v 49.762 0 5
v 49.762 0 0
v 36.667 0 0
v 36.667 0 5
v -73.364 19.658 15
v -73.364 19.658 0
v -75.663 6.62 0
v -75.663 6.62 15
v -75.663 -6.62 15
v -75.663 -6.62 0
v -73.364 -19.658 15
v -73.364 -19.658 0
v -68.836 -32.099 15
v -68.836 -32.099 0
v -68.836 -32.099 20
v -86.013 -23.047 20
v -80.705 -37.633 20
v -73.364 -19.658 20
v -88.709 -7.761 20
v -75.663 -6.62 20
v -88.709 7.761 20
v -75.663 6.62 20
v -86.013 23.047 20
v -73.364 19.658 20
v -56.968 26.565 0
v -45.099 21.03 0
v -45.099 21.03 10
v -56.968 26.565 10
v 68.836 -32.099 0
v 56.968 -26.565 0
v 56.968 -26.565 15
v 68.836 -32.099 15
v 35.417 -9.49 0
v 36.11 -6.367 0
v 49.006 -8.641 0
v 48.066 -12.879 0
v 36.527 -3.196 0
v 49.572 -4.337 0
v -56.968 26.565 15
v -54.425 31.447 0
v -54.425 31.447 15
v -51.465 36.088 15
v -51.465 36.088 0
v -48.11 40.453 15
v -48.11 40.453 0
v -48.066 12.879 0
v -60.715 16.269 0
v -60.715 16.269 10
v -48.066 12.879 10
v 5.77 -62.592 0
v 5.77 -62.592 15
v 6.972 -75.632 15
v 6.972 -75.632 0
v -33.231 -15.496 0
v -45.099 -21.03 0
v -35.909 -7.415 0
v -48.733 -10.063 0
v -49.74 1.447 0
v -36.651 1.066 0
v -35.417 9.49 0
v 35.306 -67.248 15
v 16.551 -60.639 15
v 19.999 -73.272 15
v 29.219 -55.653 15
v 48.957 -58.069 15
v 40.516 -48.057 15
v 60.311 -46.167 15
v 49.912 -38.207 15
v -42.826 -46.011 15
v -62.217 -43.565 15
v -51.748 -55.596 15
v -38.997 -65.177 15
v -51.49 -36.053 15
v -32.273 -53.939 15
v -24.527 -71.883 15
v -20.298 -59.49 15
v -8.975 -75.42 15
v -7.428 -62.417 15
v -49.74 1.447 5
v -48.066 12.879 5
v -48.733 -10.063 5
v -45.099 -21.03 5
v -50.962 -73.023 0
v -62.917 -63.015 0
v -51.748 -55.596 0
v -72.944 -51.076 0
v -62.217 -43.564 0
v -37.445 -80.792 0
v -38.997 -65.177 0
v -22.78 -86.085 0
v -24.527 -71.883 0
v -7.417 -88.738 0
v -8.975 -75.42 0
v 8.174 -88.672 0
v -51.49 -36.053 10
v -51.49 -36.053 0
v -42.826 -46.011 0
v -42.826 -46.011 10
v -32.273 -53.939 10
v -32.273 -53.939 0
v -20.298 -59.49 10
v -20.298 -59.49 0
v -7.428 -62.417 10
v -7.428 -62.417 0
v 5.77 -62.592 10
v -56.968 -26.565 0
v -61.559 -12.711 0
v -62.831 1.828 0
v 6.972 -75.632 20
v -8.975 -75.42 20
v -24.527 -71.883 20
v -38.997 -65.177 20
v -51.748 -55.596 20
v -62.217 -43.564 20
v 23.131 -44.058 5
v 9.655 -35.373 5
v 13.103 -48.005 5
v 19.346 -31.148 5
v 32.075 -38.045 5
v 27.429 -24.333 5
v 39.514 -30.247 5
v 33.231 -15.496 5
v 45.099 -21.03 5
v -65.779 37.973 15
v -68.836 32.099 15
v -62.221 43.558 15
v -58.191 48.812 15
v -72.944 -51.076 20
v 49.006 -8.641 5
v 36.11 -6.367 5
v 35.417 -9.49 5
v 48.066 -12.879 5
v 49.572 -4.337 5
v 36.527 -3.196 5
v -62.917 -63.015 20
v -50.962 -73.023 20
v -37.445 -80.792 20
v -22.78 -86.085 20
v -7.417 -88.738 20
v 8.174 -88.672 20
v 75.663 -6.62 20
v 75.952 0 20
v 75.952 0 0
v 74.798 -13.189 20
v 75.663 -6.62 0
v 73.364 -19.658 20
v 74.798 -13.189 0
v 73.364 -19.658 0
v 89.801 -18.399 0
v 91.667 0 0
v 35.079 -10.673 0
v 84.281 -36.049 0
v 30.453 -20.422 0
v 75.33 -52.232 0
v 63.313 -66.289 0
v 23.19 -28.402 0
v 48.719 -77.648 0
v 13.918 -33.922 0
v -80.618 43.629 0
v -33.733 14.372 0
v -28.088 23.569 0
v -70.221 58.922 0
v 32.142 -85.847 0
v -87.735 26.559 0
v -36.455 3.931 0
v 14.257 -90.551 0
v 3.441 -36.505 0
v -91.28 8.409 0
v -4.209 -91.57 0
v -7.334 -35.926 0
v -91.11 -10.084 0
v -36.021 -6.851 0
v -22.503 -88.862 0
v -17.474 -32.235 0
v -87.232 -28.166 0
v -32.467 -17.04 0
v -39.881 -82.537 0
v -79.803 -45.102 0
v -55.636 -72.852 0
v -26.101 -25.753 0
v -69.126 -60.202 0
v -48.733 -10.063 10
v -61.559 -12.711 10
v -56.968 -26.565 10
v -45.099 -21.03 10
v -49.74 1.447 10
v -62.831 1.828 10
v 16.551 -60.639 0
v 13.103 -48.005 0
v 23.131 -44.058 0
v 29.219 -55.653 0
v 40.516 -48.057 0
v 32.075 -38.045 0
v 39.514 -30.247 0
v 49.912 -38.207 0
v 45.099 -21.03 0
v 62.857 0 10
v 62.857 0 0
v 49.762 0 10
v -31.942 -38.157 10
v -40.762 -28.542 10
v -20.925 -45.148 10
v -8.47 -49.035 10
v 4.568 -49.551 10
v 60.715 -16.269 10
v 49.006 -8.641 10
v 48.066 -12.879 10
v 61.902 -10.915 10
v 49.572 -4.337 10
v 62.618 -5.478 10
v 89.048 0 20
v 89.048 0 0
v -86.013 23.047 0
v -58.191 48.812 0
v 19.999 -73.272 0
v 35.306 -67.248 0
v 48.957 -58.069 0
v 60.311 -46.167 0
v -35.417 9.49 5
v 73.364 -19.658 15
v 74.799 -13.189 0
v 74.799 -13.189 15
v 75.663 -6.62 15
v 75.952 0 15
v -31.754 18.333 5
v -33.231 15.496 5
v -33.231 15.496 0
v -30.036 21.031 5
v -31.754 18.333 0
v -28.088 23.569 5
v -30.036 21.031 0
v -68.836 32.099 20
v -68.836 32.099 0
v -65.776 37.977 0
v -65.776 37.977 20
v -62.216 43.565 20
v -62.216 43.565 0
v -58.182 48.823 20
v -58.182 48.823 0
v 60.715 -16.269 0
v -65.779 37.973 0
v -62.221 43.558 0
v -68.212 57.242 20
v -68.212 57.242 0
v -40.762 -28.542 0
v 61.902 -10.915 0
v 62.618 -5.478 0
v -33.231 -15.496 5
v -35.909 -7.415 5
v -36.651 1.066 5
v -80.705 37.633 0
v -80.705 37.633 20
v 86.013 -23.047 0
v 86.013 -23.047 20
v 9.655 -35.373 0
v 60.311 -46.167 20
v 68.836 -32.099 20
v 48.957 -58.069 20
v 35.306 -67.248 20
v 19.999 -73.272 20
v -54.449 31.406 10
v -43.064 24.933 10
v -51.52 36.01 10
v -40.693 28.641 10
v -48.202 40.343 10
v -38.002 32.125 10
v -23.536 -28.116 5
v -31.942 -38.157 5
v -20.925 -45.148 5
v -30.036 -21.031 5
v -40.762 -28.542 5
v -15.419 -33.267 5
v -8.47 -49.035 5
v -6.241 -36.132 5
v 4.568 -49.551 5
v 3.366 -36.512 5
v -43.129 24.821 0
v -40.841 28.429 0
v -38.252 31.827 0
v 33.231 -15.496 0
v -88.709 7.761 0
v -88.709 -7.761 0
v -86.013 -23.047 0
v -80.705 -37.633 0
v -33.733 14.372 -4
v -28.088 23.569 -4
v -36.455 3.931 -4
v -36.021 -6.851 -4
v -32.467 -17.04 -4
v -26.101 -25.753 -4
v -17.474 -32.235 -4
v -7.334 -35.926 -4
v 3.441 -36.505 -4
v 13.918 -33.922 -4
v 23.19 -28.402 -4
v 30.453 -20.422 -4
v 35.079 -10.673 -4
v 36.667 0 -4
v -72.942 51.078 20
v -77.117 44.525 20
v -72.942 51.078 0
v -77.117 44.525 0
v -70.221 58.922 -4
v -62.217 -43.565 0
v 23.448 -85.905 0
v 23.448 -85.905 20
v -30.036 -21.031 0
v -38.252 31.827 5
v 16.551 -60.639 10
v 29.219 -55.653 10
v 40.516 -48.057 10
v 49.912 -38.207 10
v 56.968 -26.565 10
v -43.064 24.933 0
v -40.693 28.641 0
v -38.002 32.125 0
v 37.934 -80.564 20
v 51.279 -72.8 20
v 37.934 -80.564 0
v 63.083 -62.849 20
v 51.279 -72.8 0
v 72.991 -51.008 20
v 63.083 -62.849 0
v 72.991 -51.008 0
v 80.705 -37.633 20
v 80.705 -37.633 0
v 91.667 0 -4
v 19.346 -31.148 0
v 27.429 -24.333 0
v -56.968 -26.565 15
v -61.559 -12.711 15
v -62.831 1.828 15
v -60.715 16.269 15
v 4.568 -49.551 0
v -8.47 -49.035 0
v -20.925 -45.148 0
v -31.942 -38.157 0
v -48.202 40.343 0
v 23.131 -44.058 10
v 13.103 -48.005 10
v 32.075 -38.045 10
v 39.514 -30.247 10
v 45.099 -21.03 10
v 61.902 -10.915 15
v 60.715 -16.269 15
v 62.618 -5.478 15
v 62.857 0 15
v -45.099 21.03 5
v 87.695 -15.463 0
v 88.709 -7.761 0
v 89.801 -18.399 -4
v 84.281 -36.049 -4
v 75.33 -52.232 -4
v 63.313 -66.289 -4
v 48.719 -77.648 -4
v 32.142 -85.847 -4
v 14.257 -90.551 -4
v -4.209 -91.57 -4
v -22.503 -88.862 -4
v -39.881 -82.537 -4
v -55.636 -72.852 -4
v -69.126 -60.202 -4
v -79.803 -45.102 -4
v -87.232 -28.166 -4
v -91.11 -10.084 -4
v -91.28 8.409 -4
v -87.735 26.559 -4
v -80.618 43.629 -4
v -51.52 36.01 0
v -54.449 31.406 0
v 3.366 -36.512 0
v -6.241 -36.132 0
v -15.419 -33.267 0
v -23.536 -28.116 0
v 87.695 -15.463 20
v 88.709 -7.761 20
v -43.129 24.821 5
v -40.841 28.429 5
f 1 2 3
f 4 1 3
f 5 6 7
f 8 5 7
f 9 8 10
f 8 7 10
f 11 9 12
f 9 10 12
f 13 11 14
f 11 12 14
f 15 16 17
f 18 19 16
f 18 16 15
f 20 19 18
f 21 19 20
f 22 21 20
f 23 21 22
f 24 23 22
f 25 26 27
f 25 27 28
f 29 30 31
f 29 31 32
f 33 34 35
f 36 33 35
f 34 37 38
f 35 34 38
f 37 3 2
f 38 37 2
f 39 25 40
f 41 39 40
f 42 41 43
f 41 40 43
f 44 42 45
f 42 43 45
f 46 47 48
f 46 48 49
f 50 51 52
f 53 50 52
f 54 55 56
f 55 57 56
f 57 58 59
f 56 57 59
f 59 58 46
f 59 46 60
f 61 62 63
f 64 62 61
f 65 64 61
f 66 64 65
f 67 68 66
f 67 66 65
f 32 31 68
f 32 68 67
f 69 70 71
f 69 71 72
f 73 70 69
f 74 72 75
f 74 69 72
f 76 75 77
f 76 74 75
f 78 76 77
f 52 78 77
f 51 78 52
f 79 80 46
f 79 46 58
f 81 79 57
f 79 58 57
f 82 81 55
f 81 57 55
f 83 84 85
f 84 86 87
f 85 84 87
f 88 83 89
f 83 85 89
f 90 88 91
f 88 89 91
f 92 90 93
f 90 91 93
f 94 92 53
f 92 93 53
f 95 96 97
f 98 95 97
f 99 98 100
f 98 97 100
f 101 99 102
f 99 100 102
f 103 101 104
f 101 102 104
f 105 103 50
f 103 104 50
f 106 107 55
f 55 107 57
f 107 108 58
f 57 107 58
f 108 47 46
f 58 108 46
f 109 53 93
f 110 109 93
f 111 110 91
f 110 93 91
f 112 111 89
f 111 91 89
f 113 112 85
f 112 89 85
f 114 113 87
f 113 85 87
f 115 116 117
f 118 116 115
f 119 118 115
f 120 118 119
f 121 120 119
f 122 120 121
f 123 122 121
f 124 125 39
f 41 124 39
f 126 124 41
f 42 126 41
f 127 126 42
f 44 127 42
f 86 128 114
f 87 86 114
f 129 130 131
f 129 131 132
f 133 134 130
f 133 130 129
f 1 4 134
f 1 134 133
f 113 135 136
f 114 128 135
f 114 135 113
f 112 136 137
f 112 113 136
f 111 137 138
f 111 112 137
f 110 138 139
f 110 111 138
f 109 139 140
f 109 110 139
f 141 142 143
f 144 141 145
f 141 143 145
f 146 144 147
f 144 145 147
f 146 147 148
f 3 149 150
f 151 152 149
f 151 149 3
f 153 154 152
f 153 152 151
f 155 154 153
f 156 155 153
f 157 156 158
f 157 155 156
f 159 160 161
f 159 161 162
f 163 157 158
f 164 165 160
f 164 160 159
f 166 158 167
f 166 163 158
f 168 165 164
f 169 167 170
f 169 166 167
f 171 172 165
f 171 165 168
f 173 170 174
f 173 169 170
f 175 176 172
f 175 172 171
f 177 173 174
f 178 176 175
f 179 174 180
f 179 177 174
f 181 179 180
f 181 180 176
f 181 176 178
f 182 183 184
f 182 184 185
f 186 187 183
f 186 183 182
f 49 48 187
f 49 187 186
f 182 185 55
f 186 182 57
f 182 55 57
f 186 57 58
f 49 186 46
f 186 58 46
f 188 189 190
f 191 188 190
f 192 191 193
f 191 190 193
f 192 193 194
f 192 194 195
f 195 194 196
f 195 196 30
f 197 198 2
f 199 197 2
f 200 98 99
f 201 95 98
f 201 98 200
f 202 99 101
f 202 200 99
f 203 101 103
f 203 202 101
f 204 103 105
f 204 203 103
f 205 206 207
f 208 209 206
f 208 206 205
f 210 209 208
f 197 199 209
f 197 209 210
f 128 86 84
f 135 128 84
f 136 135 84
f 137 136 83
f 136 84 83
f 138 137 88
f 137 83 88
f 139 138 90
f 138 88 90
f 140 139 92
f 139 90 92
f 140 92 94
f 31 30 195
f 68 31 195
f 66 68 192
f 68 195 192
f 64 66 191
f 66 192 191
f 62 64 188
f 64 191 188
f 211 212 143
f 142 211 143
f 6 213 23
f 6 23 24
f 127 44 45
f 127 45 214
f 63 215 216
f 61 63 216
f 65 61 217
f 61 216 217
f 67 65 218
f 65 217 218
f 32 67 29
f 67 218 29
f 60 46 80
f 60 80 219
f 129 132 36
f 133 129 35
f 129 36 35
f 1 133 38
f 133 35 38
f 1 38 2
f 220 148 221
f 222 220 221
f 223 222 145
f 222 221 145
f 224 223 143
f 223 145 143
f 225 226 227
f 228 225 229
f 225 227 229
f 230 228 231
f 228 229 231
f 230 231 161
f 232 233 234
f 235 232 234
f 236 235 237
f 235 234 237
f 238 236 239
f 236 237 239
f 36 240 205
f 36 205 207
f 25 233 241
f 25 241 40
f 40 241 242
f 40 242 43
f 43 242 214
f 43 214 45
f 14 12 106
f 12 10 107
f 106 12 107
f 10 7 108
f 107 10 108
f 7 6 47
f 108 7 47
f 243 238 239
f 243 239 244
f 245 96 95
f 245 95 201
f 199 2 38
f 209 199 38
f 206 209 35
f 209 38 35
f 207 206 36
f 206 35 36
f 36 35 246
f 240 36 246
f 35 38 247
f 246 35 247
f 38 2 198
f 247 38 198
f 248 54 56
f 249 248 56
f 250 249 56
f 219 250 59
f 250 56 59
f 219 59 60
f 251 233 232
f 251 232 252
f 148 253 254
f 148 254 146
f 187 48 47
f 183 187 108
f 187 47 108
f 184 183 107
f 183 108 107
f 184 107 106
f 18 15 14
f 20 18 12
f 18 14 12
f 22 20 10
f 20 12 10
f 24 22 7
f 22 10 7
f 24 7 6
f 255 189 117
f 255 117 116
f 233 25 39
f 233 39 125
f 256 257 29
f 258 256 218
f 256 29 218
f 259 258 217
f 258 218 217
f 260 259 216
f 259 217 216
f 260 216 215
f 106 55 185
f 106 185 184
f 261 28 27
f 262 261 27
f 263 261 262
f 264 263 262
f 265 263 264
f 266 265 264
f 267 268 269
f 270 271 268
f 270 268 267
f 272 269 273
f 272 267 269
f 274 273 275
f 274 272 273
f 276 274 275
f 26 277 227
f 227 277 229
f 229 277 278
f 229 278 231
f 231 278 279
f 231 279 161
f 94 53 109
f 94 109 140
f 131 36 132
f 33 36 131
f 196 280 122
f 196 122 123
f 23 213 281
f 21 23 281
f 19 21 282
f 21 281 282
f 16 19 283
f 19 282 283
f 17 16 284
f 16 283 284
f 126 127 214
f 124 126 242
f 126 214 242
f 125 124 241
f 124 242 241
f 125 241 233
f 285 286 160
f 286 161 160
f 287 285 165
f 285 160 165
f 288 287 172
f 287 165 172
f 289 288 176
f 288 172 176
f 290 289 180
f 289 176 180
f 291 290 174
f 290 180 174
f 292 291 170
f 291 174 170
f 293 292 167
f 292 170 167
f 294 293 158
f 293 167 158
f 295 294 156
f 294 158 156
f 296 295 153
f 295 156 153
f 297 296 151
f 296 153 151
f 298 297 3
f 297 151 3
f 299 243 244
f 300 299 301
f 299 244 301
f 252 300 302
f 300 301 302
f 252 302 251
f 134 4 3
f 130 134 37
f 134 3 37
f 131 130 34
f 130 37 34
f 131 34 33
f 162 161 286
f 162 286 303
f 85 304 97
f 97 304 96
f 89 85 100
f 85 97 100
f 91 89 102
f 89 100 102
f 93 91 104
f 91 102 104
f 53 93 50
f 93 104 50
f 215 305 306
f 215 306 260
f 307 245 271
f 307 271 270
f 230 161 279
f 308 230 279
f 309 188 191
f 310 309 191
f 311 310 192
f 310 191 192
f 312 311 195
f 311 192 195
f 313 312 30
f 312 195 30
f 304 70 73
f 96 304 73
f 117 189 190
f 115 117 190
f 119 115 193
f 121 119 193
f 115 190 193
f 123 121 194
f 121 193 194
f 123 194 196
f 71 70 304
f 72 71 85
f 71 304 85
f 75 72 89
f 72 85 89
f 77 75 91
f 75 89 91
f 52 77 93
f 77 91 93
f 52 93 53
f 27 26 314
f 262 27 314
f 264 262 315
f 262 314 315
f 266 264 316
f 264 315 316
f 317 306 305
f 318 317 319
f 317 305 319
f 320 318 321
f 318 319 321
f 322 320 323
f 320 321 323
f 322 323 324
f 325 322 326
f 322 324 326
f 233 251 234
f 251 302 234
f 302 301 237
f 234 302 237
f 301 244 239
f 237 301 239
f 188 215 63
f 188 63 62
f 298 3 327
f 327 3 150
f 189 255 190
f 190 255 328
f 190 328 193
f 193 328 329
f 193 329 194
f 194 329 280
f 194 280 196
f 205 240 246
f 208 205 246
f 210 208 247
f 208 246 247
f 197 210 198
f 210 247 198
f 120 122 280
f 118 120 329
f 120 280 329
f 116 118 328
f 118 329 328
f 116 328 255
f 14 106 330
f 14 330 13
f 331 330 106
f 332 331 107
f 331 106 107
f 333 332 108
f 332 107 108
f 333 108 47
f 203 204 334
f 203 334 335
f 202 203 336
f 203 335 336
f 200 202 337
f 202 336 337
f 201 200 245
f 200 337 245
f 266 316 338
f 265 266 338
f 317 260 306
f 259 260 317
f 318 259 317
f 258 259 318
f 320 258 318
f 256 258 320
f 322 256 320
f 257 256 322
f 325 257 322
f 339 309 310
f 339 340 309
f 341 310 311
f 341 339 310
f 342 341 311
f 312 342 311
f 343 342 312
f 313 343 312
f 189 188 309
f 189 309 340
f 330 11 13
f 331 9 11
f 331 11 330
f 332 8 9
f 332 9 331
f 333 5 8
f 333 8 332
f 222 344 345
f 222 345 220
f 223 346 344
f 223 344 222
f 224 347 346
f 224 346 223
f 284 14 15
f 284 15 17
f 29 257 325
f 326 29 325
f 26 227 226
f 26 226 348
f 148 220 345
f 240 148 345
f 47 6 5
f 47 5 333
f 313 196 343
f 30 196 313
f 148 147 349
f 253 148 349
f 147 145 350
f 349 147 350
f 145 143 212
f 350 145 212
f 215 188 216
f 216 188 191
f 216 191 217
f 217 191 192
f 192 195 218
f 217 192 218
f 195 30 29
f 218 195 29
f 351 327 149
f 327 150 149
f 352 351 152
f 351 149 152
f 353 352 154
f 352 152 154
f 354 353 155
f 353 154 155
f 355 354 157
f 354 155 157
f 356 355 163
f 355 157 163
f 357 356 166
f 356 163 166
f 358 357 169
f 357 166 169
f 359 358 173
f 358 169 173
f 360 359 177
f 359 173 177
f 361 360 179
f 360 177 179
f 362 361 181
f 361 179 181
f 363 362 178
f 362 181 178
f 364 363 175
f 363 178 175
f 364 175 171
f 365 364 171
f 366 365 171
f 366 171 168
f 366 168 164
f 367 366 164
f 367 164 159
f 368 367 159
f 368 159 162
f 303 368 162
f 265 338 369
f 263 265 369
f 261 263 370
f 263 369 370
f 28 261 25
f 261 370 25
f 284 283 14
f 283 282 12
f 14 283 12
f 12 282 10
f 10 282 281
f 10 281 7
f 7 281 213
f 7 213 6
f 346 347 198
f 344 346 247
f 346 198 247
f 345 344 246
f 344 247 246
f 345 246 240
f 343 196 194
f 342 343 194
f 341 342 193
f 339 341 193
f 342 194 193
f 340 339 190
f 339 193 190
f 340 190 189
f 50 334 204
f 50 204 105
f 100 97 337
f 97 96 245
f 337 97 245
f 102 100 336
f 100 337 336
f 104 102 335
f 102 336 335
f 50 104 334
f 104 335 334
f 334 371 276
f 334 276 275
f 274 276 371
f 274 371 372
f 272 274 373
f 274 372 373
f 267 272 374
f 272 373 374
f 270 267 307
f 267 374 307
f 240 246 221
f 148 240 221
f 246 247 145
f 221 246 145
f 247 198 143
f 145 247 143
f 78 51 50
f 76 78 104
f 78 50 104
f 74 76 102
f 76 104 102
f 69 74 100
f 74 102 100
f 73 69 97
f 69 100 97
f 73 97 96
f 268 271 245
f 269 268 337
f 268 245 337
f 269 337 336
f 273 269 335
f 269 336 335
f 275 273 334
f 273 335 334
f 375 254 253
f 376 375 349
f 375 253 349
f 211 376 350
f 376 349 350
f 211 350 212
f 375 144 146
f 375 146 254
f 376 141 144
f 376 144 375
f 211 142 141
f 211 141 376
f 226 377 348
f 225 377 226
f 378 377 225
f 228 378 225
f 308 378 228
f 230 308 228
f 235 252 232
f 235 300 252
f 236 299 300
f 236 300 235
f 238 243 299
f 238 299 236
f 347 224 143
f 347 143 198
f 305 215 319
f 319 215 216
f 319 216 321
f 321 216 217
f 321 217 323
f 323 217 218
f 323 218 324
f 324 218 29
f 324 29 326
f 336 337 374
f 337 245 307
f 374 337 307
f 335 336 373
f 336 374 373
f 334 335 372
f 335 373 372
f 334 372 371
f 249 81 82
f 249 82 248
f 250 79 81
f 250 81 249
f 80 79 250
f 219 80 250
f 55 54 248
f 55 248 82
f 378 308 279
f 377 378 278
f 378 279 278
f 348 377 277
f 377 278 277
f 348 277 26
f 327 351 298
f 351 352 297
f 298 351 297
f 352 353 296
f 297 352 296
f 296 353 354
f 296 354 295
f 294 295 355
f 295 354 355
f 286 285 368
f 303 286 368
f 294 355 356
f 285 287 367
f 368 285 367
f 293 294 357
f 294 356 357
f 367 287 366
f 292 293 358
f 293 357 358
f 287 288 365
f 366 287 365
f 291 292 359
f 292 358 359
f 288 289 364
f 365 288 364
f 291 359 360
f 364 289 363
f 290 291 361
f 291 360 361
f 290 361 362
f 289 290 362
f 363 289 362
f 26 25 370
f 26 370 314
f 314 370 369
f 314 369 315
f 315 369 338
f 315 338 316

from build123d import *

# Parameters (mm, degrees)
F0_W      = 91.66666
F0_H      = 4
F1_ANGLE  = 220
F2_R      = 36.666665
F3_DEPTH  = 12.5
F5_DEPTH  = 5
F7_DEPTH  = 10
F9_DEPTH  = 15
F11_DEPTH = 20
F13_DEPTH = 29
F15_DEPTH = 25


with BuildPart() as f1:
    # F0 (on Front) → F1 (revolve)
    with BuildSketch(Plane.XZ):
        with Locations((45.83333, -2)):
            Rectangle(F0_W, F0_H)
    revolve(axis=Axis((0, 0, -2), (0, 0, -1)), revolution_arc=F1_ANGLE)

    # F2 (on Top) → F3 (cut, symmetric)
    with BuildSketch(Plane.XY):
        Circle(F2_R)
    extrude(amount=F3_DEPTH, both=True, mode=Mode.SUBTRACT)


with BuildPart() as f5:
    # F4 (on Top) → F5 (new body)
    with BuildSketch(Plane.XY):
        with BuildLine():
            ThreePointArc((36.6666665, 0), (-12.540655641, -34.4554261085), (-28.0884095207, 23.5687437684))
            Line((-28.0884095207, 23.5687437684), (-38.2522682412, 31.827203092))
            ThreePointArc((-38.2522682412, 31.827203092), (-16.9221251054, -46.7958178064), (49.7615, 0))
            Line((49.7615, 0), (36.6666665, 0))
        make_face()
    extrude(amount=F5_DEPTH)


with BuildPart() as f7:
    # F6 (on Top) → F7 (new body)
    with BuildSketch(Plane.XY):
        with BuildLine():
            ThreePointArc((49.7615, 0), (-17.1048840177, -46.7293251074), (-38.0023264518, 32.1252247696))
            Line((-38.0023264518, 32.1252247696), (-48.2022163099, 40.3431239363))
            ThreePointArc((-48.2022163099, 40.3431239363), (-21.4612134466, -59.0799257237), (62.85715, 0))
            Line((62.85715, 0), (49.7615, 0))
        make_face()
    extrude(amount=F7_DEPTH)


with BuildPart() as f9:
    # F8 (on Top) → F9 (new body)
    with BuildSketch(Plane.XY):
        with BuildLine():
            Line((-48.1102146254, 40.452778615), (-58.190830552, 48.8118254671))
            ThreePointArc((-58.190830552, 48.8118254671), (-25.9714634488, -71.3740159448), (75.9524, 0))
            Line((75.9524, 0), (62.85714, 0))
            ThreePointArc((62.85714, 0), (-21.5284643303, -59.0554423619), (-48.1102146254, 40.452778615))
        make_face()
    extrude(amount=F9_DEPTH)


with BuildPart() as f11:
    # F10 (on Top) → F11 (new body)
    with BuildSketch(Plane.XY):
        with BuildLine():
            ThreePointArc((75.95235, 0), (-25.9780129339, -71.3715791792), (-58.1818094968, 48.8225000814))
            Line((-58.1818094968, 48.8225000814), (-68.2119472637, 57.2416397061))
            ThreePointArc((-68.2119472637, 57.2416397061), (-30.4578796914, -83.6767149837), (89.0476, 0))
            Line((89.0476, 0), (75.95235, 0))
        make_face()
    extrude(amount=F11_DEPTH)


with BuildPart() as f13_tool:
    # F12 (on Top) → F13 (new body)
    with BuildSketch(Plane.XY):
        Polygon((94.6472080148, -25.3606429534), (0, 0), (88.5066497486, -41.2713285754), align=None)
        Polygon((-94.3287258626, 25.2753059179), (0, 0), (-88.8055123304, 41.4106904861), align=None)
    extrude(amount=F13_DEPTH)


with BuildPart() as f5_1:
    add(f5.part)

    # F13: cut by f13_tool
    add(f13_tool.part, mode=Mode.SUBTRACT)


with BuildPart() as f7_1:
    add(f7.part)

    # F13: cut by f13_tool
    add(f13_tool.part, mode=Mode.SUBTRACT)


with BuildPart() as f9_1:
    add(f9.part)

    # F13: cut by f13_tool
    add(f13_tool.part, mode=Mode.SUBTRACT)


with BuildPart() as f11_1:
    add(f11.part)

    # F13: cut by f13_tool
    add(f13_tool.part, mode=Mode.SUBTRACT)


with BuildPart() as f15_tool:
    # F14 (on Top) → F15 (new body)
    with BuildSketch(Plane.XY):
        Polygon((-80.2769003403, -56.2104907624), (0, 0), (-88.8181631296, -41.4165896506), align=None)
        Polygon((25.0542324687, -91.7911742938), (0, 0), (8.8207321241, -95.6856161356), align=None)
    extrude(amount=F15_DEPTH)


with BuildPart() as f5_2:
    add(f5_1.part)

    # F15: cut by f15_tool
    add(f15_tool.part, mode=Mode.SUBTRACT)


with BuildPart() as f7_2:
    add(f7_1.part)

    # F15: cut by f15_tool
    add(f15_tool.part, mode=Mode.SUBTRACT)


with BuildPart() as f9_2:
    add(f9_1.part)

    # F15: cut by f15_tool
    add(f15_tool.part, mode=Mode.SUBTRACT)


with BuildPart() as f11_2:
    add(f11_1.part)

    # F15: cut by f15_tool
    add(f15_tool.part, mode=Mode.SUBTRACT)


solid = Compound([f1.part, f5_2.part, f7_2.part, f9_2.part, f11_2.part])
